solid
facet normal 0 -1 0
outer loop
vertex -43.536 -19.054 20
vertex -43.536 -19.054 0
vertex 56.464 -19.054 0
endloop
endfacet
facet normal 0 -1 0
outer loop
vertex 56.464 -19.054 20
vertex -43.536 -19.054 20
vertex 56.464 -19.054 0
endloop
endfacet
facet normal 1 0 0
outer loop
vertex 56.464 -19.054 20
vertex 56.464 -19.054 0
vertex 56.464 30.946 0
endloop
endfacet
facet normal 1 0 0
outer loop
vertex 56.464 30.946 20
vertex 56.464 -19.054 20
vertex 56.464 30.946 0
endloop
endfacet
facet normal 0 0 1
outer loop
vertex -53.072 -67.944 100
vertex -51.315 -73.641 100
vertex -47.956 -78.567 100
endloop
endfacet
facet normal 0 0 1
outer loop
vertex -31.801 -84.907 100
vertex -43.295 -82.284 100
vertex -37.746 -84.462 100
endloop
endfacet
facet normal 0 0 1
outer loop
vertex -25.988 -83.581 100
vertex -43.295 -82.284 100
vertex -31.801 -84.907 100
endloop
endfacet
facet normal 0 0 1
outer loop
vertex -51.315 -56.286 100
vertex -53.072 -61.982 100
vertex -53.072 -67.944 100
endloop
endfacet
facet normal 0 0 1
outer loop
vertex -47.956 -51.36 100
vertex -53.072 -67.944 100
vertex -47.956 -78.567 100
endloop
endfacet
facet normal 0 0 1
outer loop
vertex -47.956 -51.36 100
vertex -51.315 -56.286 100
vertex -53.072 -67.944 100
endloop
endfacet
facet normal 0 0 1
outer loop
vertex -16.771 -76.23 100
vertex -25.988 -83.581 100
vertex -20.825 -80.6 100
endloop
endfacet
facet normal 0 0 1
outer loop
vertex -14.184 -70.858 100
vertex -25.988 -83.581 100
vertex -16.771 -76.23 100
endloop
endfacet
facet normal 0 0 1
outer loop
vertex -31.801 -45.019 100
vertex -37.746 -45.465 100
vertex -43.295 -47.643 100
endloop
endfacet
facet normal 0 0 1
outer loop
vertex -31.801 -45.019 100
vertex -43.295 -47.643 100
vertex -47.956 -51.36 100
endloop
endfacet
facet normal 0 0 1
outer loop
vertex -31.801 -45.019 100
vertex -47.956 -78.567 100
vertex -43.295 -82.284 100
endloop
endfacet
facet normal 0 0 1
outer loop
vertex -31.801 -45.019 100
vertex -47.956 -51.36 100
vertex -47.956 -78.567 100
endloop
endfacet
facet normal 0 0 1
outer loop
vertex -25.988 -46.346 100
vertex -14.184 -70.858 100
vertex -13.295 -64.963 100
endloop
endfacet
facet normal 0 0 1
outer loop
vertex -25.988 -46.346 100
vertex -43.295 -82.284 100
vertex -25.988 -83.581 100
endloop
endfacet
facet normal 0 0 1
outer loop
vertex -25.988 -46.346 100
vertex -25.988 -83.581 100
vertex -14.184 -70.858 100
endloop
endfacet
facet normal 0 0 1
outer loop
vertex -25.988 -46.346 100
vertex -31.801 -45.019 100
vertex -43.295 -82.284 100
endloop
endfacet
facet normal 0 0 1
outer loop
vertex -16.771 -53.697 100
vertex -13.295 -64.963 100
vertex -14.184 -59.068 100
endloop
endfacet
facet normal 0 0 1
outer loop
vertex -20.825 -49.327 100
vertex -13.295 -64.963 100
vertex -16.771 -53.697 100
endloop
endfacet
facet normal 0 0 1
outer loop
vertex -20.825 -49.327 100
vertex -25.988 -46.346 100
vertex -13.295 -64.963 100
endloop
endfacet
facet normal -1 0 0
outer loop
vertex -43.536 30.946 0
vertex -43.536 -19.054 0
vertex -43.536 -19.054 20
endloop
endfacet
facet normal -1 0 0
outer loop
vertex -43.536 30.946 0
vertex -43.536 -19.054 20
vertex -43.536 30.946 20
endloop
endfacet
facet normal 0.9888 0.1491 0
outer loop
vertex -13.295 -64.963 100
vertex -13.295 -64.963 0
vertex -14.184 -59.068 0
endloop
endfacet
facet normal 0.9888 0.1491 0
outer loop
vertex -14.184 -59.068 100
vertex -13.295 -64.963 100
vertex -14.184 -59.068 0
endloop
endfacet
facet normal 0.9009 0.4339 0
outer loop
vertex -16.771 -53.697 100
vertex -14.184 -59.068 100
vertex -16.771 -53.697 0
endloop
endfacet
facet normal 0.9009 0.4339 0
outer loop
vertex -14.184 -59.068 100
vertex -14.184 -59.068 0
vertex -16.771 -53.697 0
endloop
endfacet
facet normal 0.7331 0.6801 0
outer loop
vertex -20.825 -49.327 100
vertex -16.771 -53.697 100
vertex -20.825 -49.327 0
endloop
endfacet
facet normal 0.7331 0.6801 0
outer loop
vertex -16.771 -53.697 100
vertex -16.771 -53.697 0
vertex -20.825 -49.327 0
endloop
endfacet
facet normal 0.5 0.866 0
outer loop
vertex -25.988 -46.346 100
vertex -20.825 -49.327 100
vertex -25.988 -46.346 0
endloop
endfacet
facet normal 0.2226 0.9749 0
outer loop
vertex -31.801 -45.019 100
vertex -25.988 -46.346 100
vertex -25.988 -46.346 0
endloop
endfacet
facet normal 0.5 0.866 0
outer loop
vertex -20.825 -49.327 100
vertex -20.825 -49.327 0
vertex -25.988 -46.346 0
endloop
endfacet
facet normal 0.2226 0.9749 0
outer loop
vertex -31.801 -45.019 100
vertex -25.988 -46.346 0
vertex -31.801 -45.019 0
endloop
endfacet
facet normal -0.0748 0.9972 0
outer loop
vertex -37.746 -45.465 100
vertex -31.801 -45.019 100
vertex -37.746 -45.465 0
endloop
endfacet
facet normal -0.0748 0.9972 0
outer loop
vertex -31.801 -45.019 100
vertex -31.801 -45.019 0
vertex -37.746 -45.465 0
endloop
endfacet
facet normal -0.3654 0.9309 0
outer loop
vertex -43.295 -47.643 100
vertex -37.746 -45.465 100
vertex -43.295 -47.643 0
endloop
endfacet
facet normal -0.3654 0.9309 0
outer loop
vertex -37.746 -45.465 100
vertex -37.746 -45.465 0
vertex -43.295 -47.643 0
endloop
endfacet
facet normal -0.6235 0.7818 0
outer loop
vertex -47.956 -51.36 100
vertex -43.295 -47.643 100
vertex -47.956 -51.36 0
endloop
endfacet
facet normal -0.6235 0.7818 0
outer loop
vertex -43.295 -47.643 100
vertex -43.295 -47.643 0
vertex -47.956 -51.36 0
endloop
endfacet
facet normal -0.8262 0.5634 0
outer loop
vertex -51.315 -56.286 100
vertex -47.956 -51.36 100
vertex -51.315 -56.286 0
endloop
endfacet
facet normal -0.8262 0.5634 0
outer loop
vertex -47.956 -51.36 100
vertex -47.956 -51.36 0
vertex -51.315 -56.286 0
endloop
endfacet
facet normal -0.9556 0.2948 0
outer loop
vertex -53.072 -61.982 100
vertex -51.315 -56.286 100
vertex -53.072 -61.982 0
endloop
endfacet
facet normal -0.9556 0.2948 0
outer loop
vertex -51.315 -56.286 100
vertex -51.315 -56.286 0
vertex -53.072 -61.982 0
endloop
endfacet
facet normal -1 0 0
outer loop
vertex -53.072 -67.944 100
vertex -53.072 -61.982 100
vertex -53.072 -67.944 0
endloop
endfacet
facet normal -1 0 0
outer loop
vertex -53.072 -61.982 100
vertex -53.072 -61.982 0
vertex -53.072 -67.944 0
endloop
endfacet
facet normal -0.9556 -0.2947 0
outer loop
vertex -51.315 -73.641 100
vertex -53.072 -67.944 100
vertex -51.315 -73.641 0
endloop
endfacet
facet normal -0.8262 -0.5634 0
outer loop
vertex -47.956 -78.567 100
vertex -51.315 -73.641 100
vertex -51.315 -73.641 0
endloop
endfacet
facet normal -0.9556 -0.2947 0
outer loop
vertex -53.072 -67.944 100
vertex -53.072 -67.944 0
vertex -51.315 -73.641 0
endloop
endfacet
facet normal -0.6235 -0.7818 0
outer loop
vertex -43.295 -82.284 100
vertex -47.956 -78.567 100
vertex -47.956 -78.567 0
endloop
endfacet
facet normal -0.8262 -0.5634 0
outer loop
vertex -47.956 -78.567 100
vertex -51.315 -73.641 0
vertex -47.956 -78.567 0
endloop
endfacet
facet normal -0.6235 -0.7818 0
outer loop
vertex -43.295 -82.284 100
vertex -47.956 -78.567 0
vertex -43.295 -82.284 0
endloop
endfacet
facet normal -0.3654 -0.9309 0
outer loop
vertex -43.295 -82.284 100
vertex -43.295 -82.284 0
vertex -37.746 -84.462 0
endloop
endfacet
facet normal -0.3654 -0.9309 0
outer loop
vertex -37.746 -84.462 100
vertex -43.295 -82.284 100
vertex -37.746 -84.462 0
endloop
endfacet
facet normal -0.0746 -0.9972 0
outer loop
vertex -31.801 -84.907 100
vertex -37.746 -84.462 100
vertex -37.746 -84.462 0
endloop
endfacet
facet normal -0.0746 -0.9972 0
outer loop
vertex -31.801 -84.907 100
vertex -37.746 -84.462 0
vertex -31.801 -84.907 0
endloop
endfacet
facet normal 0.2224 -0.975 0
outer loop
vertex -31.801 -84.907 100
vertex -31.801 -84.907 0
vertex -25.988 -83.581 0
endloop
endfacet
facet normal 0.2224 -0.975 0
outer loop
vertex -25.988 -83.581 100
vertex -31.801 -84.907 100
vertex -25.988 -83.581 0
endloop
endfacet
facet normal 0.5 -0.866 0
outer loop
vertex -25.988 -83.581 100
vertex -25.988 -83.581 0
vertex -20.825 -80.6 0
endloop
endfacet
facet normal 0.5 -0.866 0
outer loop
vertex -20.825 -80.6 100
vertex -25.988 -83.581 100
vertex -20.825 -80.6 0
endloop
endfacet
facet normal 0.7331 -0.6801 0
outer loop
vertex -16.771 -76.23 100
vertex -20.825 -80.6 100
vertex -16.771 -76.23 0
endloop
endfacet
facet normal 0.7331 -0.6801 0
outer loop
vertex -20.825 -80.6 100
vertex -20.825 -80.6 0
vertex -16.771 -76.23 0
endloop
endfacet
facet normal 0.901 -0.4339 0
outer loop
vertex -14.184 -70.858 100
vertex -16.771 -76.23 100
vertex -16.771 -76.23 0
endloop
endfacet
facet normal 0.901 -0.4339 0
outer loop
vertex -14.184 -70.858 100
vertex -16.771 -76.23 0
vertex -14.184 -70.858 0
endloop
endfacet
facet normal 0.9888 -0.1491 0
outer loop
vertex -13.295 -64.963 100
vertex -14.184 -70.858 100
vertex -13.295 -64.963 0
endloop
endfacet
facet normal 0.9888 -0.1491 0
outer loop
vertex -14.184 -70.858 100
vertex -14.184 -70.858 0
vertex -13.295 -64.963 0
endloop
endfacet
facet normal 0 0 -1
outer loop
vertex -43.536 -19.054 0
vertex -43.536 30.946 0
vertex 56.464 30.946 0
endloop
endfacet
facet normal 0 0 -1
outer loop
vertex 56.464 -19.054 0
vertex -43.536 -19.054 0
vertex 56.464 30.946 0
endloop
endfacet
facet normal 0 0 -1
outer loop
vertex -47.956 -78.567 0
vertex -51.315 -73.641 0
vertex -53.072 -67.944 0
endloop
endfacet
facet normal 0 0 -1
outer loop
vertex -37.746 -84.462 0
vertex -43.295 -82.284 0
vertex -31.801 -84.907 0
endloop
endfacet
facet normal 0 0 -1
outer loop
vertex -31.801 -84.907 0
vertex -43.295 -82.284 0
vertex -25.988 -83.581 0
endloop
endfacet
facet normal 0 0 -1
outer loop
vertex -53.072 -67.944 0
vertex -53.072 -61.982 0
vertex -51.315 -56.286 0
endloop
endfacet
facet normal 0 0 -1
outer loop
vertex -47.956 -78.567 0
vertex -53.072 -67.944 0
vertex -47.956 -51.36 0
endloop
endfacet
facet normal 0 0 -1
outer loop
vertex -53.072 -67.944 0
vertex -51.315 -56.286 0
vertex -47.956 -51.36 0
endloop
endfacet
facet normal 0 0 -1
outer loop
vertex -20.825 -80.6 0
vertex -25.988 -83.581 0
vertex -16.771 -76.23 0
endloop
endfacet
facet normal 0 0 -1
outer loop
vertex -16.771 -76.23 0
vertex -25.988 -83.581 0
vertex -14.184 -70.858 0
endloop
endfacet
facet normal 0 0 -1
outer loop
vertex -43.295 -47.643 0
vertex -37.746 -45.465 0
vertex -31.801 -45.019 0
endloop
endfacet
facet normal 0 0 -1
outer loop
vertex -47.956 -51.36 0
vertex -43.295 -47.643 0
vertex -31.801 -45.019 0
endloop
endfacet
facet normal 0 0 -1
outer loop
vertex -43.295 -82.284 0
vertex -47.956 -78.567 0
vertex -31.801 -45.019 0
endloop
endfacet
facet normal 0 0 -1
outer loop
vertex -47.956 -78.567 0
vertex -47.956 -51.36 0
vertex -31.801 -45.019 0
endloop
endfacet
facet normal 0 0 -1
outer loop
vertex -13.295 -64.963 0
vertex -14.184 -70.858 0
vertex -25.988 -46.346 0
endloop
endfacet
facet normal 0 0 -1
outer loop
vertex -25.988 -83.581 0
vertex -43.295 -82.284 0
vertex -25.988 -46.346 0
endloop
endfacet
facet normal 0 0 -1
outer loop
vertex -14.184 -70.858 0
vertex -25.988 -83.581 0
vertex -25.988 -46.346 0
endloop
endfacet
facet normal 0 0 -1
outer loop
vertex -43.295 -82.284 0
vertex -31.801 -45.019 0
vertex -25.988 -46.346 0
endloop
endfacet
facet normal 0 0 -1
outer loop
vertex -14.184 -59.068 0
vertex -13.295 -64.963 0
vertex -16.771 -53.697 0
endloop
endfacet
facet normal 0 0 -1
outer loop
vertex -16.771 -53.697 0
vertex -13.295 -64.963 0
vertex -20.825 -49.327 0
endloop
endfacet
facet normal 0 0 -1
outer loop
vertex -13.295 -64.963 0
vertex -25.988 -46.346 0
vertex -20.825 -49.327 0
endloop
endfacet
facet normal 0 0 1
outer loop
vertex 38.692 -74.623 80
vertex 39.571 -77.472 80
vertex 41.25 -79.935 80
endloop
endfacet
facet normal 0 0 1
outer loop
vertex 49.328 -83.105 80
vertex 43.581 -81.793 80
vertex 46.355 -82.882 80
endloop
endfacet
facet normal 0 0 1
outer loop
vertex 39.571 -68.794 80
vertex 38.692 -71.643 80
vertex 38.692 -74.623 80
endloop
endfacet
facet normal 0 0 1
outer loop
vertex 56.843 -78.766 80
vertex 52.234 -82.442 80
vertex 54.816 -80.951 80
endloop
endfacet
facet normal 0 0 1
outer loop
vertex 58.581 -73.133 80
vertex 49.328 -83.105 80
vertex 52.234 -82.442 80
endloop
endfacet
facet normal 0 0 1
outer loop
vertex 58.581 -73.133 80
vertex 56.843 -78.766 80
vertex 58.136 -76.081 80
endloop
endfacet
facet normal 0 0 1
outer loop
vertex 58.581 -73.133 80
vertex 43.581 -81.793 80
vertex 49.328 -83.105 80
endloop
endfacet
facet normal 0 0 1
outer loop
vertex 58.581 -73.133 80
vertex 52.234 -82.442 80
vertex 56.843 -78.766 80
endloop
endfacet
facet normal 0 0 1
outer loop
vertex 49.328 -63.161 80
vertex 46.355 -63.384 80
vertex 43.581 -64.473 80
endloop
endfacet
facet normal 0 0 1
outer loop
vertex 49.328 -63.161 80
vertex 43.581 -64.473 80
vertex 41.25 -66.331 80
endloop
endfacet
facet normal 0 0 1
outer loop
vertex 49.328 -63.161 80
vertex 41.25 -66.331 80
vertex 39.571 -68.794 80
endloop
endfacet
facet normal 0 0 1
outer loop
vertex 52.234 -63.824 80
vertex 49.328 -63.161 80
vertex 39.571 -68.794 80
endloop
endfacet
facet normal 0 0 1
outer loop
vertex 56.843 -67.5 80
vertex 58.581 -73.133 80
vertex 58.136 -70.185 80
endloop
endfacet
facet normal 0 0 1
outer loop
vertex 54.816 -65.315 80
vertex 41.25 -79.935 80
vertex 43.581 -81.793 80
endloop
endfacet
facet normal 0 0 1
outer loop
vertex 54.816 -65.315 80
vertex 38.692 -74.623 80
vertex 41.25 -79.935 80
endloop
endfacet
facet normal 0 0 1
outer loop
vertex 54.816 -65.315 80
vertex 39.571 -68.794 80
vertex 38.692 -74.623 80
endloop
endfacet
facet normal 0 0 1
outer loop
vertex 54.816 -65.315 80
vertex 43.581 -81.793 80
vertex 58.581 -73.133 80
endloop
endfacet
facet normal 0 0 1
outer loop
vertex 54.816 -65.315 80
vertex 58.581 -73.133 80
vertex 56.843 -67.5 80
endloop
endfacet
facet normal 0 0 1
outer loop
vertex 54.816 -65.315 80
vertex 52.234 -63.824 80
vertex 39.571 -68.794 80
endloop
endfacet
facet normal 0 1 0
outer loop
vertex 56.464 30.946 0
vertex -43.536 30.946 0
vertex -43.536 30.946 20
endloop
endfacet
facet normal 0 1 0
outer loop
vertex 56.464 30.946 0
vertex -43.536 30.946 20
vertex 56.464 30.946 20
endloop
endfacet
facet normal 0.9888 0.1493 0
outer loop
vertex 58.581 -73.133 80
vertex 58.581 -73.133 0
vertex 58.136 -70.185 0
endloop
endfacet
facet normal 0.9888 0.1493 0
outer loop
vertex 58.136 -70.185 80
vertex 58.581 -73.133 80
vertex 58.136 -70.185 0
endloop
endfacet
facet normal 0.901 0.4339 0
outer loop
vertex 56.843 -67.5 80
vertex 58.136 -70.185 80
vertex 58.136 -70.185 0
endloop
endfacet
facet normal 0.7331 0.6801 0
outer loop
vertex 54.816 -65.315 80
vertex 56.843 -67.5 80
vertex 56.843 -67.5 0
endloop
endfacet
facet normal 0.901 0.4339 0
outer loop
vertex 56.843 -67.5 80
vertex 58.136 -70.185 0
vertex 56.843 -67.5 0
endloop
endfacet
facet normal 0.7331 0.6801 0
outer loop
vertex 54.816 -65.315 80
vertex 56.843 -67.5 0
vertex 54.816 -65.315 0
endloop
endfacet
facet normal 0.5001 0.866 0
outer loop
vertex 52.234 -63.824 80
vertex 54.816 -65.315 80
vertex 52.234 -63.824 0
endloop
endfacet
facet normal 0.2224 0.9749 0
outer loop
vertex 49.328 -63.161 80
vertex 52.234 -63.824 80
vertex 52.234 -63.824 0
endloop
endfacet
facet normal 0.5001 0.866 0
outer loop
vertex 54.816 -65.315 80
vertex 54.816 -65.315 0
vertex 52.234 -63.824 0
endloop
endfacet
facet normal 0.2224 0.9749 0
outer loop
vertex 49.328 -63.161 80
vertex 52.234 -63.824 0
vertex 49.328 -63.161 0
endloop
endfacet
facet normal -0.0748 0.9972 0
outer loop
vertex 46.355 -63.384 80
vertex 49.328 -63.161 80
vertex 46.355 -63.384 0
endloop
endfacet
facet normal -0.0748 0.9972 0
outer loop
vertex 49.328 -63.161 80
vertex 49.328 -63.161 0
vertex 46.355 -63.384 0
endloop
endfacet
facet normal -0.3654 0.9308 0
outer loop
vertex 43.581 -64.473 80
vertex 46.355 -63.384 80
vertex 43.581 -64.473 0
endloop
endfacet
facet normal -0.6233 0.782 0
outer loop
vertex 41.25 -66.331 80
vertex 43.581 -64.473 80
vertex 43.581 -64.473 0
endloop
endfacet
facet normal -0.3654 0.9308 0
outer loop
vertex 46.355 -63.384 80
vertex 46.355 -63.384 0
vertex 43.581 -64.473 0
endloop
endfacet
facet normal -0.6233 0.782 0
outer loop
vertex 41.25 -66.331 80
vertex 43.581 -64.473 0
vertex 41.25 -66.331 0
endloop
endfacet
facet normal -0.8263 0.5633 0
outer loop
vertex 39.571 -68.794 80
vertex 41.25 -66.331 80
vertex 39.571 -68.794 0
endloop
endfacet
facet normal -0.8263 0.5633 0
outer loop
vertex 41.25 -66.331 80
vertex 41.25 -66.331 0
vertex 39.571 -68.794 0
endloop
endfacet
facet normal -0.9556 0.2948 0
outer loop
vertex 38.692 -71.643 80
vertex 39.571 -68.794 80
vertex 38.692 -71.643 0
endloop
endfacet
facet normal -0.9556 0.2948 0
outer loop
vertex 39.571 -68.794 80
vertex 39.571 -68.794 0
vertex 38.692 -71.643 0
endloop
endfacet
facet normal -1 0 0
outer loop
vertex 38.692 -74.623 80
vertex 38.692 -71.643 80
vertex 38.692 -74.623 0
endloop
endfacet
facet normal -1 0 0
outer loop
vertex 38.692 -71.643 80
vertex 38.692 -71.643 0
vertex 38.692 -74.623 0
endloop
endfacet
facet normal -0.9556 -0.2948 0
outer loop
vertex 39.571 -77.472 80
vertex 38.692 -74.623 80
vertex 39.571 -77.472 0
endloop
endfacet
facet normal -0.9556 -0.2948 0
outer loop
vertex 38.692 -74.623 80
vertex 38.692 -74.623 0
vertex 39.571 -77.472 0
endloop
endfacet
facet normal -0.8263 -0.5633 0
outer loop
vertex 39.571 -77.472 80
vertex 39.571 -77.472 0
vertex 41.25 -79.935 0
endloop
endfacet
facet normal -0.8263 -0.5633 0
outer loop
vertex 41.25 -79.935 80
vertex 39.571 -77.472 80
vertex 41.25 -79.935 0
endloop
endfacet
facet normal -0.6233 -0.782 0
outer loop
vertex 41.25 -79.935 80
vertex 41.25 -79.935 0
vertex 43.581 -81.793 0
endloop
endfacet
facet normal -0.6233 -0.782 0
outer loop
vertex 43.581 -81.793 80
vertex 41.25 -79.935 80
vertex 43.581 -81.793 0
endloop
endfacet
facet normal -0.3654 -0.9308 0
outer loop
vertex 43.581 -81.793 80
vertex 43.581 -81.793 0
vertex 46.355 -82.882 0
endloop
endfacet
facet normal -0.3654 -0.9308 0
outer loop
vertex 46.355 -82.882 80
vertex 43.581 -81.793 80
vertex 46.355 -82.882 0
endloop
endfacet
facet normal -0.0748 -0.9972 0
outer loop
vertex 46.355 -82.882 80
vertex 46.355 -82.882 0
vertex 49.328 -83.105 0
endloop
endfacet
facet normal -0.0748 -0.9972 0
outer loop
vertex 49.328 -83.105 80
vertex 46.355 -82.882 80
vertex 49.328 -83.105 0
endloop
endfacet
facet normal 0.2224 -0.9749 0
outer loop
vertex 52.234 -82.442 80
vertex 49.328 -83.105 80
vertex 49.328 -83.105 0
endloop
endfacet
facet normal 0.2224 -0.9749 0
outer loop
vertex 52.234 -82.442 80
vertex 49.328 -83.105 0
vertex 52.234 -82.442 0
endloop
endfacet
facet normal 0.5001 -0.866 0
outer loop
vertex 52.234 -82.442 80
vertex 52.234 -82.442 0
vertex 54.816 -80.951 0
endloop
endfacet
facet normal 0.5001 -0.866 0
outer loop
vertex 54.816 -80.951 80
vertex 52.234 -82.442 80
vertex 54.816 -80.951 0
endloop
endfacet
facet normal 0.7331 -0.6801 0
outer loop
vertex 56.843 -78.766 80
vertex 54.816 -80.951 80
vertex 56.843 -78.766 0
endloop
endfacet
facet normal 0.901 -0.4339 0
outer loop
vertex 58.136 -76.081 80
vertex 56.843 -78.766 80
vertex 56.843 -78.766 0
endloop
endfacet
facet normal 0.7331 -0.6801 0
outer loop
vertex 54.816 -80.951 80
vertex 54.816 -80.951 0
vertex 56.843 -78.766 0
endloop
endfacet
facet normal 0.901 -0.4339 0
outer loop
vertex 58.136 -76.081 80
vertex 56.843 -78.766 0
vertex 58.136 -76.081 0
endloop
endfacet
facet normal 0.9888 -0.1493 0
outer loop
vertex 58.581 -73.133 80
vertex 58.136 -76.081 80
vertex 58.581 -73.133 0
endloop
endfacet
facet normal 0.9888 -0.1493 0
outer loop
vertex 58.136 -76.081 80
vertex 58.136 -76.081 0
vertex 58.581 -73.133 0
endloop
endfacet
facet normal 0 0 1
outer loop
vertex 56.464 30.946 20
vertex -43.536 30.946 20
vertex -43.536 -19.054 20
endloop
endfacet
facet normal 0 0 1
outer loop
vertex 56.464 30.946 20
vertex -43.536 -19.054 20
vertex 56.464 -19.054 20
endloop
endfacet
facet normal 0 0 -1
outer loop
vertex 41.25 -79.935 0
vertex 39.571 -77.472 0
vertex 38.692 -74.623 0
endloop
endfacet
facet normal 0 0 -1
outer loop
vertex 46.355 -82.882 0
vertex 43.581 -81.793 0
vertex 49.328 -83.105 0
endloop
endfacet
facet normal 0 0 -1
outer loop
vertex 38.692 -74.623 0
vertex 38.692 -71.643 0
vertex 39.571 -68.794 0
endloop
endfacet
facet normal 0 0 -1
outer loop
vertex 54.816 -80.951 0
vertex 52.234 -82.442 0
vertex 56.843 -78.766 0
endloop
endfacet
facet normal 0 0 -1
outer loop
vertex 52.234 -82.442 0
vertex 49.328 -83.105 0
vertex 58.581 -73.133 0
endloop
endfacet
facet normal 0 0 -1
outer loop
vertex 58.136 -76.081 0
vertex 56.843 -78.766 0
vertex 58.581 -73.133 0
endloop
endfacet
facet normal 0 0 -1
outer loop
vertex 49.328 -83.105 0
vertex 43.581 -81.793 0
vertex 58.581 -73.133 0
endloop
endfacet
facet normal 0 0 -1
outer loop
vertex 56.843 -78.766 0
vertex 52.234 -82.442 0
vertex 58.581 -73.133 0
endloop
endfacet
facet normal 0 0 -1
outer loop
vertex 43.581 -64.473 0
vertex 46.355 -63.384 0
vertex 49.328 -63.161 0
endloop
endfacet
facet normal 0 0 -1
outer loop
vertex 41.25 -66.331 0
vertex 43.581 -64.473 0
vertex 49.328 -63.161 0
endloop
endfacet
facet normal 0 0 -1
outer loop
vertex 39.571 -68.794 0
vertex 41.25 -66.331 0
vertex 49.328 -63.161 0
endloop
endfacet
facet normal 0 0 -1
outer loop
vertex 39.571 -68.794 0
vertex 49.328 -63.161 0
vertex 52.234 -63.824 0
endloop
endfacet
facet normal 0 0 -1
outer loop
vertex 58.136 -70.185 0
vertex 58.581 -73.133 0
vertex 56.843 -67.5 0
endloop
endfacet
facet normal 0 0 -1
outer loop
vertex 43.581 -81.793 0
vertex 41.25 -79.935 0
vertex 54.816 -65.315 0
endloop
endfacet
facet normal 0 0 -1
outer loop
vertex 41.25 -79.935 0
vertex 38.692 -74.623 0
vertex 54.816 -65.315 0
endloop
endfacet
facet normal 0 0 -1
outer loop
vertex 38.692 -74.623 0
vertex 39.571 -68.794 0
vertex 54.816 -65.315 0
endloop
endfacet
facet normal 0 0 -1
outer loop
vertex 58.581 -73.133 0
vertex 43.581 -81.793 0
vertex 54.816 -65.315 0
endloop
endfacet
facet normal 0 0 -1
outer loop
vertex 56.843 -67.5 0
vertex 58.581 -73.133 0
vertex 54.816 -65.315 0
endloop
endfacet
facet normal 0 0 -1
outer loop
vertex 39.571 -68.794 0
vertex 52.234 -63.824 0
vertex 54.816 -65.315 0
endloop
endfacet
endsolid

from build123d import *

# Parameters (mm, degrees)
F0_W     = 100
F0_H     = 50
F1_DEPTH = 20
F0_R     = 10
F2_DEPTH = 80
F0_R_2   = 20
F3_DEPTH = 100


with BuildPart() as f1:
    # F0 (on Top) → F1 (new body)
    with BuildSketch(Plane.XY):
        with Locations((6.464395, 5.945636)):
            Rectangle(F0_W, F0_H)
    extrude(amount=F1_DEPTH)


with BuildPart() as f2:
    # F0 (on Top) → F2 (new body)
    with BuildSketch(Plane.XY):
        with Locations((48.580647, -73.133022)):
            Circle(F0_R)
    extrude(amount=F2_DEPTH)


with BuildPart() as f3:
    # F0 (on Top) → F3 (new body)
    with BuildSketch(Plane.XY):
        with Locations((-33.295278, -64.963214)):
            Circle(F0_R_2)
    extrude(amount=F3_DEPTH)


solid = Compound([f1.part, f2.part, f3.part])
